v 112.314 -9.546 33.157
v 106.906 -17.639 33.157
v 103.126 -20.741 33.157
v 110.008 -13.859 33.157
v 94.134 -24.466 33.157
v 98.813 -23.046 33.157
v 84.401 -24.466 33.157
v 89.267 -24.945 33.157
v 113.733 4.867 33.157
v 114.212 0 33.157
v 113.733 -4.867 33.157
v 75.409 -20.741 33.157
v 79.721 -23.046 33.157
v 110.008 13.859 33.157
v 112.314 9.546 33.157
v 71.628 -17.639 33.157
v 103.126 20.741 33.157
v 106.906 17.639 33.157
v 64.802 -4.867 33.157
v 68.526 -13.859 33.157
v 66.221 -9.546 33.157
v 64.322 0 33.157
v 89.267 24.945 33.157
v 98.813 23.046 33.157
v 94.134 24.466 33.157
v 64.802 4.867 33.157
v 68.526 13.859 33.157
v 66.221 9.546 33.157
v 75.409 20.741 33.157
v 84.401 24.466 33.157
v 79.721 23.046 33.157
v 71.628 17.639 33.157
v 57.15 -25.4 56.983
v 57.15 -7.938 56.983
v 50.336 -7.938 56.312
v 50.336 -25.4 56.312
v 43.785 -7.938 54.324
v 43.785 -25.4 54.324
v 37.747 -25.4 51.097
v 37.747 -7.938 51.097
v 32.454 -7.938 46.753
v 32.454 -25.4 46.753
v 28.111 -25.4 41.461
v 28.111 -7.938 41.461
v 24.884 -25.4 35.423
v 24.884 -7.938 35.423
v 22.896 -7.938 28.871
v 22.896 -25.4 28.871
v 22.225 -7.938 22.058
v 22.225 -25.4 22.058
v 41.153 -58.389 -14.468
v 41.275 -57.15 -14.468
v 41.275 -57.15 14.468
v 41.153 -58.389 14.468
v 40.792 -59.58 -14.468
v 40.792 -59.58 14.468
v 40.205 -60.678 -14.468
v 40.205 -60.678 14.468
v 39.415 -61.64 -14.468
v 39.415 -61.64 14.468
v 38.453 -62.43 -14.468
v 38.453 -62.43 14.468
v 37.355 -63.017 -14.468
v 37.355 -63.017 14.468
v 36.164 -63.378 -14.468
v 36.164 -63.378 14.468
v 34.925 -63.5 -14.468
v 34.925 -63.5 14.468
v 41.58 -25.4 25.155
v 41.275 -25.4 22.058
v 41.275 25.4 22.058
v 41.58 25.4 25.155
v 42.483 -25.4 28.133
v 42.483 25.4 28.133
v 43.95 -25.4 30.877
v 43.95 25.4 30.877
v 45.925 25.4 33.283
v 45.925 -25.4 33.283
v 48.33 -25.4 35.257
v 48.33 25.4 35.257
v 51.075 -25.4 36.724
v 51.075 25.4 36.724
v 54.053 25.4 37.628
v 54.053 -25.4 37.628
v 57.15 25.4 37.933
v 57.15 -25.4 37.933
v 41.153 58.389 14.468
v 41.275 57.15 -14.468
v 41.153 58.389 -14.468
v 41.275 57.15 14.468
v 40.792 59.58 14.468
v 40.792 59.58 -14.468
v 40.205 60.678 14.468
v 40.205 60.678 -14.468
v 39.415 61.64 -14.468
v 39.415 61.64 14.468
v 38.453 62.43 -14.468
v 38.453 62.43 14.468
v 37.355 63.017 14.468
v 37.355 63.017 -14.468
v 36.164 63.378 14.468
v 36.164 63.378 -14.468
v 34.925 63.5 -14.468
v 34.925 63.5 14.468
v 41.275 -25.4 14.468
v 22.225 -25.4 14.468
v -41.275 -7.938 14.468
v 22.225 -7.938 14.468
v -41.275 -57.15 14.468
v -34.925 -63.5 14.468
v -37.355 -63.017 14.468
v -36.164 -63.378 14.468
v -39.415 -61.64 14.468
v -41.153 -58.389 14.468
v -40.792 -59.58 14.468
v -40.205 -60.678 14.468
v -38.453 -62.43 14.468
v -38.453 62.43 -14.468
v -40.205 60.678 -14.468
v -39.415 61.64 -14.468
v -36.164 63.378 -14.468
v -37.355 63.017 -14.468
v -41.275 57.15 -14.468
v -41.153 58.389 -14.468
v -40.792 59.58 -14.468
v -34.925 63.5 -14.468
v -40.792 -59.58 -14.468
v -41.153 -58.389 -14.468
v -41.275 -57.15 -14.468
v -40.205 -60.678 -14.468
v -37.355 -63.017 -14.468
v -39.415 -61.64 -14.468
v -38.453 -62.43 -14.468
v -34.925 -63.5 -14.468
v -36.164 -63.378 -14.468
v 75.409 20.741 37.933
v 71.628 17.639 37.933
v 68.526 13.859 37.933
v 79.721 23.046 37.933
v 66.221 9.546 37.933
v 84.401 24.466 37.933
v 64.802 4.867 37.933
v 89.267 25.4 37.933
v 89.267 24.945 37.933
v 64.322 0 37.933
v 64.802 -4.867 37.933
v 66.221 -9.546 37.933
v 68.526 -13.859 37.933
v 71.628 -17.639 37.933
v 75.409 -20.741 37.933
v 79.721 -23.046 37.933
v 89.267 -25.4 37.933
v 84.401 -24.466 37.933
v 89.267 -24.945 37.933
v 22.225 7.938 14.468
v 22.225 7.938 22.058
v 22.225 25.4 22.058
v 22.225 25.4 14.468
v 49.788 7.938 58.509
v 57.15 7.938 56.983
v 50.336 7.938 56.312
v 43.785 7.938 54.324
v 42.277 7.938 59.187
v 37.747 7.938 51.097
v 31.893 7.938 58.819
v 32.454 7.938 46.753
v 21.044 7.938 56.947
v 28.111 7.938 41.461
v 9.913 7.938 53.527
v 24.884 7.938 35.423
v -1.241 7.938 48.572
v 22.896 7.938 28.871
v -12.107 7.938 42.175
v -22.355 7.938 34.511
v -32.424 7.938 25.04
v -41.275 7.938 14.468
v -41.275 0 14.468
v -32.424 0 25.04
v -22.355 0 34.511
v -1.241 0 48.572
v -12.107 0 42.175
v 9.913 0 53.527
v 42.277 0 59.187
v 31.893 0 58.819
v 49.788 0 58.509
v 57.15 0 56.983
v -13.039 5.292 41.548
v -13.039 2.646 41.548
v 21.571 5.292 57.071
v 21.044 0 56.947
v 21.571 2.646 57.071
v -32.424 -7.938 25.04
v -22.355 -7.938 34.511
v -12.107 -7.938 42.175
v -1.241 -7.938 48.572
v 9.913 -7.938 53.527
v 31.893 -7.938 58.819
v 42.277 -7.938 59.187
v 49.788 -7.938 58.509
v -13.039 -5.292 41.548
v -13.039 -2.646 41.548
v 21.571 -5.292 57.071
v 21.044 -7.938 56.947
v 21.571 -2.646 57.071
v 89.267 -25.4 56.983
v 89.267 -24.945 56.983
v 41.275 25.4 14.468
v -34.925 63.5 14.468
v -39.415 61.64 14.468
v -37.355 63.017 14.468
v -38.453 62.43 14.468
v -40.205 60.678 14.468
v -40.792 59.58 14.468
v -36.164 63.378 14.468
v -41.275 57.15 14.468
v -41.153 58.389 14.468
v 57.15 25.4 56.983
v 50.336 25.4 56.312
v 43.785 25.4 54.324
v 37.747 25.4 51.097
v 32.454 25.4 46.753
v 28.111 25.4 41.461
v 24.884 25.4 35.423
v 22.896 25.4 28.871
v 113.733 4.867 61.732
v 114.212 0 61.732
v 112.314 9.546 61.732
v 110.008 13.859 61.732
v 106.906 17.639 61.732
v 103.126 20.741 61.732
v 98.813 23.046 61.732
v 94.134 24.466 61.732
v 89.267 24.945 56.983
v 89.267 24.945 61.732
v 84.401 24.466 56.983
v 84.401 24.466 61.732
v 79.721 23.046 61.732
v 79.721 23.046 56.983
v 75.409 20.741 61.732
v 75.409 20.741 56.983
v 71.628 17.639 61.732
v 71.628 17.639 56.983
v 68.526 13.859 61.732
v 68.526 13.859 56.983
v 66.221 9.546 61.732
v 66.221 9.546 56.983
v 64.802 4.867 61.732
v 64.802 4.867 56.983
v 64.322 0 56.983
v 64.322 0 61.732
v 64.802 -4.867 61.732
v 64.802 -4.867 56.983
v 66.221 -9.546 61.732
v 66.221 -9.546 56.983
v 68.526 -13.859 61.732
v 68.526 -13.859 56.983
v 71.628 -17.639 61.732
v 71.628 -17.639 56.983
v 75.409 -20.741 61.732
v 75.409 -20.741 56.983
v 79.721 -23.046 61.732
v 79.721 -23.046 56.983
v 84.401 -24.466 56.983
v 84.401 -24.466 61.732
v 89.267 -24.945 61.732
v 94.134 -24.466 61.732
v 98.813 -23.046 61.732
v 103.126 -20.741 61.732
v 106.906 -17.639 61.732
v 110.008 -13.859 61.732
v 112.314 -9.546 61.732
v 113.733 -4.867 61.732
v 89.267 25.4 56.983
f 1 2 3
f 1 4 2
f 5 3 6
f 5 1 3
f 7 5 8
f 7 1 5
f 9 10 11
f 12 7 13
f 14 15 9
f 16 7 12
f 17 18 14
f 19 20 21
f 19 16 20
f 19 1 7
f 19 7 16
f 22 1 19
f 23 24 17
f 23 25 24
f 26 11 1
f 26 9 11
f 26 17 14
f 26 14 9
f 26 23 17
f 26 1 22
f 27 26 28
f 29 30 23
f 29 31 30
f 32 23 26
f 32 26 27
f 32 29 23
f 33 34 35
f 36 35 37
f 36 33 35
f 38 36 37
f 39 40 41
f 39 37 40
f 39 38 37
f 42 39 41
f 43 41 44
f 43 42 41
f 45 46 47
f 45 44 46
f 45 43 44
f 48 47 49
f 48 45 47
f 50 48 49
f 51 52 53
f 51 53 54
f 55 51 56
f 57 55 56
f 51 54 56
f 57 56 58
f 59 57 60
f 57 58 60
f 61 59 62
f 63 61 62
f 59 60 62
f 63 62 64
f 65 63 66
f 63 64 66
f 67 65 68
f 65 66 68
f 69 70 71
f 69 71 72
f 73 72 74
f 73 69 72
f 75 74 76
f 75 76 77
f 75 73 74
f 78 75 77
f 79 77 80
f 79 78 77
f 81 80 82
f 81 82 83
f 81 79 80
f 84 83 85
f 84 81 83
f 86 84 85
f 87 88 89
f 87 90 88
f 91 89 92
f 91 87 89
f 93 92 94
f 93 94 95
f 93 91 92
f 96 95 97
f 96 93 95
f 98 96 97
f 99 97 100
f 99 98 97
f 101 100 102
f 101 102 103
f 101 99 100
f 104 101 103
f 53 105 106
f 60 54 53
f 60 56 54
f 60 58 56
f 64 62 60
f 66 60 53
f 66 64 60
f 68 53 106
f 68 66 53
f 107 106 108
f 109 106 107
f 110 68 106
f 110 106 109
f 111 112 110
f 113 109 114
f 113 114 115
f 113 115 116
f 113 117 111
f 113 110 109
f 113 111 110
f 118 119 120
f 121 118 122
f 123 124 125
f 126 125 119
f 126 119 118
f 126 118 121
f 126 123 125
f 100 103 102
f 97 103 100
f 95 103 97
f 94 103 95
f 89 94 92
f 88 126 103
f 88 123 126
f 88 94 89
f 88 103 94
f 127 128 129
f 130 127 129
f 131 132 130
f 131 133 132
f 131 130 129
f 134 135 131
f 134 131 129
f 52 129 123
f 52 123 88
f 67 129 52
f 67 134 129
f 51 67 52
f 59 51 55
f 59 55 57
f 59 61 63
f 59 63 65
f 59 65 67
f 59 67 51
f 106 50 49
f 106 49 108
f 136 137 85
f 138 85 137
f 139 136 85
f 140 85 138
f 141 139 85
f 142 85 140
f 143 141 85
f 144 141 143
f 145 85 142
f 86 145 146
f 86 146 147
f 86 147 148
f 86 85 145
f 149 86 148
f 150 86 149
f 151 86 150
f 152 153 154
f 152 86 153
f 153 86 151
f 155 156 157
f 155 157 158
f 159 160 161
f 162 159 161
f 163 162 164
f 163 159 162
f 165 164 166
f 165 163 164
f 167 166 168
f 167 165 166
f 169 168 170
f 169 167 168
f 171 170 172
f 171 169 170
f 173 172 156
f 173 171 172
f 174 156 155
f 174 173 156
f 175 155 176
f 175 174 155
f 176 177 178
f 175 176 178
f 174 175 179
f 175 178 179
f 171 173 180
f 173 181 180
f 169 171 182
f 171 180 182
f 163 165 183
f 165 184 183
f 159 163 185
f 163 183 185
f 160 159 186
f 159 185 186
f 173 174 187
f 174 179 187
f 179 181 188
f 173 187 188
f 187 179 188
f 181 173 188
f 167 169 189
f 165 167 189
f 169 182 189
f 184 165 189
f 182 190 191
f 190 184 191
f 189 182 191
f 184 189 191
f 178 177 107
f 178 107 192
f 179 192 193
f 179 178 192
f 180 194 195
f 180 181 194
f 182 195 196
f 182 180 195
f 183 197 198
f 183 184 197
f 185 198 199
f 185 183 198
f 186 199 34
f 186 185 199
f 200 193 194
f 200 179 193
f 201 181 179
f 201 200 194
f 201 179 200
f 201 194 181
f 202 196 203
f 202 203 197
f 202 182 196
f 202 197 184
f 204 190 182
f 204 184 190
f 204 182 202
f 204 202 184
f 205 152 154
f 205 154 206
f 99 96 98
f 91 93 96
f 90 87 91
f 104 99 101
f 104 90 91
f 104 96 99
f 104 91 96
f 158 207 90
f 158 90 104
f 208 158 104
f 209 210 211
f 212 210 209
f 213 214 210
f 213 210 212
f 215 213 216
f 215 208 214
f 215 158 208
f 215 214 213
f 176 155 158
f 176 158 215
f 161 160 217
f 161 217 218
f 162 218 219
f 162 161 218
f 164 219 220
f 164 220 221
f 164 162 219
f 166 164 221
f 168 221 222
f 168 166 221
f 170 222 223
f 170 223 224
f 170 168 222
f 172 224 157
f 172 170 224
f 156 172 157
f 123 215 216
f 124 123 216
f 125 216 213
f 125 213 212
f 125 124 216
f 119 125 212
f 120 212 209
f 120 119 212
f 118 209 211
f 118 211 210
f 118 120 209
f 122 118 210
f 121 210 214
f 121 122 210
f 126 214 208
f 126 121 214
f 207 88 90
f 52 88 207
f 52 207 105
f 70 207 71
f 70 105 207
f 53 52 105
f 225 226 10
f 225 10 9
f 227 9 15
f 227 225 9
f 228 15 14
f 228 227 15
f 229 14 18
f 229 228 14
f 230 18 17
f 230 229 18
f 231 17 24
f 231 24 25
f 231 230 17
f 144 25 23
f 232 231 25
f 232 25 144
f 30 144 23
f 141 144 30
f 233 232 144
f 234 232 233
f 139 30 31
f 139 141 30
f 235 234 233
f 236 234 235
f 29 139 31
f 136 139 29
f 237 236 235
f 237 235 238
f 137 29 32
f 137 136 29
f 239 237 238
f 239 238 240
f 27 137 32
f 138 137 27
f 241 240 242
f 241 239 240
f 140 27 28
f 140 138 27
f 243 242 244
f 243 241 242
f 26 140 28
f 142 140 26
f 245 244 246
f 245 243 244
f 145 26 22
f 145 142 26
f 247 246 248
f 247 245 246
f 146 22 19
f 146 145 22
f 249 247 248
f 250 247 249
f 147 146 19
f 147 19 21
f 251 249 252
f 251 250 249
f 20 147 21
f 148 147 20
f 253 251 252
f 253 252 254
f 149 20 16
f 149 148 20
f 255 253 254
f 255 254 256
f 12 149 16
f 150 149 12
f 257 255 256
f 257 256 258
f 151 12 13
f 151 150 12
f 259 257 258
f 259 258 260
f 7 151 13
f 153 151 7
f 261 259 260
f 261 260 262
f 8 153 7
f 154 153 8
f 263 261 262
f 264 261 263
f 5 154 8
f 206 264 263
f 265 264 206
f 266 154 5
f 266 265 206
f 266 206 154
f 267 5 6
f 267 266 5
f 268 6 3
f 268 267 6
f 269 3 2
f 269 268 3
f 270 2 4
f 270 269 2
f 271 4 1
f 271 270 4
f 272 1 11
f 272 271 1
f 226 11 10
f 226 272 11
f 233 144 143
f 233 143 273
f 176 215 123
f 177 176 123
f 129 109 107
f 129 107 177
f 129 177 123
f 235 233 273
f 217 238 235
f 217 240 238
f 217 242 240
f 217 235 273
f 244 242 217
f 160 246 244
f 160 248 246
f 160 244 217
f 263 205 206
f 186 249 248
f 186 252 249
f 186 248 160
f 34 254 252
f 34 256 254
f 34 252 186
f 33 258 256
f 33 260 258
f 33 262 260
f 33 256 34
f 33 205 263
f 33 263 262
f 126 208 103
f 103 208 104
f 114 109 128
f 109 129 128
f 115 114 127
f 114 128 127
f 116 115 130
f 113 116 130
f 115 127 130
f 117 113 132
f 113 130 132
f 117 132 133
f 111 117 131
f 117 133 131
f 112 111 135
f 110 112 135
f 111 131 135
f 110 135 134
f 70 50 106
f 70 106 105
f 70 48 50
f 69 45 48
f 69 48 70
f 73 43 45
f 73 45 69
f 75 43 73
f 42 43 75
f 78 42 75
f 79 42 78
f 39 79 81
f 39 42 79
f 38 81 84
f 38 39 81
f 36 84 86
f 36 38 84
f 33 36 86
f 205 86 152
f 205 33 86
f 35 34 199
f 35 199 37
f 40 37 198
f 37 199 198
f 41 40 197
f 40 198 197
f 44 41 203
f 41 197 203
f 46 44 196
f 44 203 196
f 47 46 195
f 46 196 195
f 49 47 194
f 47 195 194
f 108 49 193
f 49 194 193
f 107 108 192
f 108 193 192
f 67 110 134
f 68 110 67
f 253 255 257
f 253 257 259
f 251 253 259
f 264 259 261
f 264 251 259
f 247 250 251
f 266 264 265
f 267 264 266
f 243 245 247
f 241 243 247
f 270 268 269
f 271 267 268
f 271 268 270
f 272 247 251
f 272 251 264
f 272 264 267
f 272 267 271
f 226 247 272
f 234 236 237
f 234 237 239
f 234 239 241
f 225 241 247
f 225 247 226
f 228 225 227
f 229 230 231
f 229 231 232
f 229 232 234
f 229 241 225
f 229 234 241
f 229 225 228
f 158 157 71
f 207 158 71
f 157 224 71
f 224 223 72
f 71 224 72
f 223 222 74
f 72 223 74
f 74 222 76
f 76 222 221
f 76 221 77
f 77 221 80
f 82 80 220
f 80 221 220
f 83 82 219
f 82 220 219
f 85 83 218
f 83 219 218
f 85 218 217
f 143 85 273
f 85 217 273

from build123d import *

# Parameters (mm, degrees)
F1_DEPTH = 63.5
F3_DEPTH = 25.4
F5_DEPTH = 7.9375
F7_R     = 6.35


with BuildPart() as f1:
    # F0 (on Front) → F1 (new body, symmetric)
    with BuildSketch(Plane.XZ):
        Polygon((22.225, 14.467527), (-41.275, 14.467527), (-41.275, -14.467527), (41.275, -14.467527), (41.275, 14.467527), align=None)
    extrude(amount=F1_DEPTH, both=True)

    # F0 (on Front) → F3 (join, symmetric)
    with BuildSketch(Plane.XZ):
        with BuildLine():
            Line((22.225, 22.057673), (22.225, 14.467527))
            Line((22.225, 14.467527), (41.275, 14.467527))
            Line((41.275, 14.467527), (41.275, 22.057673))
            ThreePointArc((41.275, 22.057673), (45.92468, 33.282993), (57.15, 37.932673))
            Line((57.15, 37.932673), (63.412444, 37.932673))
            Line((63.412444, 37.932673), (63.412444, 56.982673))
            Line((63.412444, 56.982673), (57.15, 56.982673))
            ThreePointArc((57.15, 56.982673), (32.454296, 46.753377), (22.225, 22.057673))
        make_face()
        Polygon((89.267325, 56.982673), (63.412444, 56.982673), (63.412444, 37.932673), (66.957286, 37.932673), (89.267325, 37.932673), align=None)
    extrude(amount=F3_DEPTH, both=True)

    # F0 (on Front) → F5 (join, symmetric)
    with BuildSketch(Plane.XZ):
        with BuildLine():
            add(Edge.make_bspline(
                [(-41.275, 14.467527), (-18.026909, 45.974523), (22.888102, 66.229478), (57.15, 56.982673)],
                knots=[0, 0, 0, 0, 107.214823, 107.214823, 107.214823, 107.214823], degree=3))
            Line((-41.275, 14.467527), (22.225, 14.467527))
            Line((22.225, 14.467527), (22.225, 22.057673))
            ThreePointArc((22.225, 22.057673), (32.454296, 46.753377), (57.15, 56.982673))
        make_face()
    extrude(amount=F5_DEPTH, both=True)

    # F0 (on Front) → F6 (revolve)
    with BuildSketch(Plane.XZ):
        Polygon((89.267325, 61.732473), (89.267325, 56.982673), (89.267325, 37.932673), (89.267325, 33.157473), (114.212444, 33.157473), (114.212444, 61.732473), align=None)
    revolve(axis=Axis((89.267325, 0, 47.444973), (0, 0, 1)))

    # F7
    f7_edges = [f1.edges().sort_by_distance(p)[0] for p in [
        (-41.275, -63.5, 0),
        (41.275, -63.5, 0),
        (41.275, 63.5, 0),
        (-41.275, 63.5, 0),
    ]]
    fillet(f7_edges, radius=F7_R)


solid = f1.part
